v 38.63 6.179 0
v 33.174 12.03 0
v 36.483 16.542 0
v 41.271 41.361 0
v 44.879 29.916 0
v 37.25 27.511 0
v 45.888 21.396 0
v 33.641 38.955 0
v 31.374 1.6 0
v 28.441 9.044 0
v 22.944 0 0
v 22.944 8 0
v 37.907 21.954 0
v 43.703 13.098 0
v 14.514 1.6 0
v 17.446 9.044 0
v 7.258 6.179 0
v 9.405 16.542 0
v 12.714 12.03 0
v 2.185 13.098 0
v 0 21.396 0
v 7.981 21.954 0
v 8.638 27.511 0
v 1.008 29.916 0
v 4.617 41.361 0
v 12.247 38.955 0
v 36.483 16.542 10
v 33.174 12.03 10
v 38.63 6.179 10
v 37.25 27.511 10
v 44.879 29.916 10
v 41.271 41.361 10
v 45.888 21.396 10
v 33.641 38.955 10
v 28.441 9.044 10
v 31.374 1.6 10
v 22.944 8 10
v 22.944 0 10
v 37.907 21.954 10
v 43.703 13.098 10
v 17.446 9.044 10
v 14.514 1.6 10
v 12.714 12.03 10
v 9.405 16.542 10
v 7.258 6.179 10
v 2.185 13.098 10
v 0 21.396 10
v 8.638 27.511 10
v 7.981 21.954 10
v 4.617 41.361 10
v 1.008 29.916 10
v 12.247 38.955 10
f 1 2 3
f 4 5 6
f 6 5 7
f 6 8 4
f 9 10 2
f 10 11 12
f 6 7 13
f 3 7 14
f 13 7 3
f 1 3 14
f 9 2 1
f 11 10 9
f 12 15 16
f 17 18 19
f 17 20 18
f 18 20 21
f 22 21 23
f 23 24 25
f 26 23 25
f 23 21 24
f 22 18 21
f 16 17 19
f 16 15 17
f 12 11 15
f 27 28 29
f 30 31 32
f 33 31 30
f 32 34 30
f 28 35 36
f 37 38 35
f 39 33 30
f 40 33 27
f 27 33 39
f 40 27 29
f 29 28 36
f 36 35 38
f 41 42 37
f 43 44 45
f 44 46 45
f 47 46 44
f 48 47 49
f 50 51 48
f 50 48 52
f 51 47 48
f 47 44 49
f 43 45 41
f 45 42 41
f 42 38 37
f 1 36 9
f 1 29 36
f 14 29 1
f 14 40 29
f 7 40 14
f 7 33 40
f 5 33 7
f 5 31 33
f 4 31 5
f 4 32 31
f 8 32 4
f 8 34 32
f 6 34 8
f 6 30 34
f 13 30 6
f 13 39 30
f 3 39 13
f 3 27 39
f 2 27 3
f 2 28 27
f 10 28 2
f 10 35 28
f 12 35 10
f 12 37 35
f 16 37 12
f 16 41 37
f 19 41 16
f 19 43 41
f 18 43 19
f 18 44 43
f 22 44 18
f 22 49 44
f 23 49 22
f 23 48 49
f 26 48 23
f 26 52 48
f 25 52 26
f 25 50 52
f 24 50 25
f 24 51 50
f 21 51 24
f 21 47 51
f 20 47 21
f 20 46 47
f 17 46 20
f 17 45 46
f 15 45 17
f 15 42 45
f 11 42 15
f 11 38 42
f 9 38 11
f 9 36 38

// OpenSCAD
$fn = 32;

// ----------------------------------------------------------------------
// Clip blank: omega clip, 10 mm thick
// ----------------------------------------------------------------------

// --- parameters (mm) ---
profile_height = 10;      // extrusion height
profile_points = 26;      // points of the closed outline

profile = [[1.008, 29.916], [0, 21.396], [2.185, 13.098], [7.258, 6.179], [14.514, 1.6], [22.944, 0], [31.374, 1.6], [38.63, 6.179], [43.703, 13.098], [45.888, 21.396], [44.879, 29.916], [41.271, 41.361], [33.641, 38.955], [37.25, 27.511], [37.907, 21.954], [36.483, 16.542], [33.174, 12.03], [28.441, 9.044], [22.944, 8], [17.446, 9.044], [12.714, 12.03], [9.405, 16.542], [7.981, 21.954], [8.638, 27.511], [12.247, 38.955], [4.617, 41.361]];  // single closed polygon, 26 points, counter clockwise

// --- the one profile operation ---
linear_extrude(height = profile_height) polygon(points = profile);
